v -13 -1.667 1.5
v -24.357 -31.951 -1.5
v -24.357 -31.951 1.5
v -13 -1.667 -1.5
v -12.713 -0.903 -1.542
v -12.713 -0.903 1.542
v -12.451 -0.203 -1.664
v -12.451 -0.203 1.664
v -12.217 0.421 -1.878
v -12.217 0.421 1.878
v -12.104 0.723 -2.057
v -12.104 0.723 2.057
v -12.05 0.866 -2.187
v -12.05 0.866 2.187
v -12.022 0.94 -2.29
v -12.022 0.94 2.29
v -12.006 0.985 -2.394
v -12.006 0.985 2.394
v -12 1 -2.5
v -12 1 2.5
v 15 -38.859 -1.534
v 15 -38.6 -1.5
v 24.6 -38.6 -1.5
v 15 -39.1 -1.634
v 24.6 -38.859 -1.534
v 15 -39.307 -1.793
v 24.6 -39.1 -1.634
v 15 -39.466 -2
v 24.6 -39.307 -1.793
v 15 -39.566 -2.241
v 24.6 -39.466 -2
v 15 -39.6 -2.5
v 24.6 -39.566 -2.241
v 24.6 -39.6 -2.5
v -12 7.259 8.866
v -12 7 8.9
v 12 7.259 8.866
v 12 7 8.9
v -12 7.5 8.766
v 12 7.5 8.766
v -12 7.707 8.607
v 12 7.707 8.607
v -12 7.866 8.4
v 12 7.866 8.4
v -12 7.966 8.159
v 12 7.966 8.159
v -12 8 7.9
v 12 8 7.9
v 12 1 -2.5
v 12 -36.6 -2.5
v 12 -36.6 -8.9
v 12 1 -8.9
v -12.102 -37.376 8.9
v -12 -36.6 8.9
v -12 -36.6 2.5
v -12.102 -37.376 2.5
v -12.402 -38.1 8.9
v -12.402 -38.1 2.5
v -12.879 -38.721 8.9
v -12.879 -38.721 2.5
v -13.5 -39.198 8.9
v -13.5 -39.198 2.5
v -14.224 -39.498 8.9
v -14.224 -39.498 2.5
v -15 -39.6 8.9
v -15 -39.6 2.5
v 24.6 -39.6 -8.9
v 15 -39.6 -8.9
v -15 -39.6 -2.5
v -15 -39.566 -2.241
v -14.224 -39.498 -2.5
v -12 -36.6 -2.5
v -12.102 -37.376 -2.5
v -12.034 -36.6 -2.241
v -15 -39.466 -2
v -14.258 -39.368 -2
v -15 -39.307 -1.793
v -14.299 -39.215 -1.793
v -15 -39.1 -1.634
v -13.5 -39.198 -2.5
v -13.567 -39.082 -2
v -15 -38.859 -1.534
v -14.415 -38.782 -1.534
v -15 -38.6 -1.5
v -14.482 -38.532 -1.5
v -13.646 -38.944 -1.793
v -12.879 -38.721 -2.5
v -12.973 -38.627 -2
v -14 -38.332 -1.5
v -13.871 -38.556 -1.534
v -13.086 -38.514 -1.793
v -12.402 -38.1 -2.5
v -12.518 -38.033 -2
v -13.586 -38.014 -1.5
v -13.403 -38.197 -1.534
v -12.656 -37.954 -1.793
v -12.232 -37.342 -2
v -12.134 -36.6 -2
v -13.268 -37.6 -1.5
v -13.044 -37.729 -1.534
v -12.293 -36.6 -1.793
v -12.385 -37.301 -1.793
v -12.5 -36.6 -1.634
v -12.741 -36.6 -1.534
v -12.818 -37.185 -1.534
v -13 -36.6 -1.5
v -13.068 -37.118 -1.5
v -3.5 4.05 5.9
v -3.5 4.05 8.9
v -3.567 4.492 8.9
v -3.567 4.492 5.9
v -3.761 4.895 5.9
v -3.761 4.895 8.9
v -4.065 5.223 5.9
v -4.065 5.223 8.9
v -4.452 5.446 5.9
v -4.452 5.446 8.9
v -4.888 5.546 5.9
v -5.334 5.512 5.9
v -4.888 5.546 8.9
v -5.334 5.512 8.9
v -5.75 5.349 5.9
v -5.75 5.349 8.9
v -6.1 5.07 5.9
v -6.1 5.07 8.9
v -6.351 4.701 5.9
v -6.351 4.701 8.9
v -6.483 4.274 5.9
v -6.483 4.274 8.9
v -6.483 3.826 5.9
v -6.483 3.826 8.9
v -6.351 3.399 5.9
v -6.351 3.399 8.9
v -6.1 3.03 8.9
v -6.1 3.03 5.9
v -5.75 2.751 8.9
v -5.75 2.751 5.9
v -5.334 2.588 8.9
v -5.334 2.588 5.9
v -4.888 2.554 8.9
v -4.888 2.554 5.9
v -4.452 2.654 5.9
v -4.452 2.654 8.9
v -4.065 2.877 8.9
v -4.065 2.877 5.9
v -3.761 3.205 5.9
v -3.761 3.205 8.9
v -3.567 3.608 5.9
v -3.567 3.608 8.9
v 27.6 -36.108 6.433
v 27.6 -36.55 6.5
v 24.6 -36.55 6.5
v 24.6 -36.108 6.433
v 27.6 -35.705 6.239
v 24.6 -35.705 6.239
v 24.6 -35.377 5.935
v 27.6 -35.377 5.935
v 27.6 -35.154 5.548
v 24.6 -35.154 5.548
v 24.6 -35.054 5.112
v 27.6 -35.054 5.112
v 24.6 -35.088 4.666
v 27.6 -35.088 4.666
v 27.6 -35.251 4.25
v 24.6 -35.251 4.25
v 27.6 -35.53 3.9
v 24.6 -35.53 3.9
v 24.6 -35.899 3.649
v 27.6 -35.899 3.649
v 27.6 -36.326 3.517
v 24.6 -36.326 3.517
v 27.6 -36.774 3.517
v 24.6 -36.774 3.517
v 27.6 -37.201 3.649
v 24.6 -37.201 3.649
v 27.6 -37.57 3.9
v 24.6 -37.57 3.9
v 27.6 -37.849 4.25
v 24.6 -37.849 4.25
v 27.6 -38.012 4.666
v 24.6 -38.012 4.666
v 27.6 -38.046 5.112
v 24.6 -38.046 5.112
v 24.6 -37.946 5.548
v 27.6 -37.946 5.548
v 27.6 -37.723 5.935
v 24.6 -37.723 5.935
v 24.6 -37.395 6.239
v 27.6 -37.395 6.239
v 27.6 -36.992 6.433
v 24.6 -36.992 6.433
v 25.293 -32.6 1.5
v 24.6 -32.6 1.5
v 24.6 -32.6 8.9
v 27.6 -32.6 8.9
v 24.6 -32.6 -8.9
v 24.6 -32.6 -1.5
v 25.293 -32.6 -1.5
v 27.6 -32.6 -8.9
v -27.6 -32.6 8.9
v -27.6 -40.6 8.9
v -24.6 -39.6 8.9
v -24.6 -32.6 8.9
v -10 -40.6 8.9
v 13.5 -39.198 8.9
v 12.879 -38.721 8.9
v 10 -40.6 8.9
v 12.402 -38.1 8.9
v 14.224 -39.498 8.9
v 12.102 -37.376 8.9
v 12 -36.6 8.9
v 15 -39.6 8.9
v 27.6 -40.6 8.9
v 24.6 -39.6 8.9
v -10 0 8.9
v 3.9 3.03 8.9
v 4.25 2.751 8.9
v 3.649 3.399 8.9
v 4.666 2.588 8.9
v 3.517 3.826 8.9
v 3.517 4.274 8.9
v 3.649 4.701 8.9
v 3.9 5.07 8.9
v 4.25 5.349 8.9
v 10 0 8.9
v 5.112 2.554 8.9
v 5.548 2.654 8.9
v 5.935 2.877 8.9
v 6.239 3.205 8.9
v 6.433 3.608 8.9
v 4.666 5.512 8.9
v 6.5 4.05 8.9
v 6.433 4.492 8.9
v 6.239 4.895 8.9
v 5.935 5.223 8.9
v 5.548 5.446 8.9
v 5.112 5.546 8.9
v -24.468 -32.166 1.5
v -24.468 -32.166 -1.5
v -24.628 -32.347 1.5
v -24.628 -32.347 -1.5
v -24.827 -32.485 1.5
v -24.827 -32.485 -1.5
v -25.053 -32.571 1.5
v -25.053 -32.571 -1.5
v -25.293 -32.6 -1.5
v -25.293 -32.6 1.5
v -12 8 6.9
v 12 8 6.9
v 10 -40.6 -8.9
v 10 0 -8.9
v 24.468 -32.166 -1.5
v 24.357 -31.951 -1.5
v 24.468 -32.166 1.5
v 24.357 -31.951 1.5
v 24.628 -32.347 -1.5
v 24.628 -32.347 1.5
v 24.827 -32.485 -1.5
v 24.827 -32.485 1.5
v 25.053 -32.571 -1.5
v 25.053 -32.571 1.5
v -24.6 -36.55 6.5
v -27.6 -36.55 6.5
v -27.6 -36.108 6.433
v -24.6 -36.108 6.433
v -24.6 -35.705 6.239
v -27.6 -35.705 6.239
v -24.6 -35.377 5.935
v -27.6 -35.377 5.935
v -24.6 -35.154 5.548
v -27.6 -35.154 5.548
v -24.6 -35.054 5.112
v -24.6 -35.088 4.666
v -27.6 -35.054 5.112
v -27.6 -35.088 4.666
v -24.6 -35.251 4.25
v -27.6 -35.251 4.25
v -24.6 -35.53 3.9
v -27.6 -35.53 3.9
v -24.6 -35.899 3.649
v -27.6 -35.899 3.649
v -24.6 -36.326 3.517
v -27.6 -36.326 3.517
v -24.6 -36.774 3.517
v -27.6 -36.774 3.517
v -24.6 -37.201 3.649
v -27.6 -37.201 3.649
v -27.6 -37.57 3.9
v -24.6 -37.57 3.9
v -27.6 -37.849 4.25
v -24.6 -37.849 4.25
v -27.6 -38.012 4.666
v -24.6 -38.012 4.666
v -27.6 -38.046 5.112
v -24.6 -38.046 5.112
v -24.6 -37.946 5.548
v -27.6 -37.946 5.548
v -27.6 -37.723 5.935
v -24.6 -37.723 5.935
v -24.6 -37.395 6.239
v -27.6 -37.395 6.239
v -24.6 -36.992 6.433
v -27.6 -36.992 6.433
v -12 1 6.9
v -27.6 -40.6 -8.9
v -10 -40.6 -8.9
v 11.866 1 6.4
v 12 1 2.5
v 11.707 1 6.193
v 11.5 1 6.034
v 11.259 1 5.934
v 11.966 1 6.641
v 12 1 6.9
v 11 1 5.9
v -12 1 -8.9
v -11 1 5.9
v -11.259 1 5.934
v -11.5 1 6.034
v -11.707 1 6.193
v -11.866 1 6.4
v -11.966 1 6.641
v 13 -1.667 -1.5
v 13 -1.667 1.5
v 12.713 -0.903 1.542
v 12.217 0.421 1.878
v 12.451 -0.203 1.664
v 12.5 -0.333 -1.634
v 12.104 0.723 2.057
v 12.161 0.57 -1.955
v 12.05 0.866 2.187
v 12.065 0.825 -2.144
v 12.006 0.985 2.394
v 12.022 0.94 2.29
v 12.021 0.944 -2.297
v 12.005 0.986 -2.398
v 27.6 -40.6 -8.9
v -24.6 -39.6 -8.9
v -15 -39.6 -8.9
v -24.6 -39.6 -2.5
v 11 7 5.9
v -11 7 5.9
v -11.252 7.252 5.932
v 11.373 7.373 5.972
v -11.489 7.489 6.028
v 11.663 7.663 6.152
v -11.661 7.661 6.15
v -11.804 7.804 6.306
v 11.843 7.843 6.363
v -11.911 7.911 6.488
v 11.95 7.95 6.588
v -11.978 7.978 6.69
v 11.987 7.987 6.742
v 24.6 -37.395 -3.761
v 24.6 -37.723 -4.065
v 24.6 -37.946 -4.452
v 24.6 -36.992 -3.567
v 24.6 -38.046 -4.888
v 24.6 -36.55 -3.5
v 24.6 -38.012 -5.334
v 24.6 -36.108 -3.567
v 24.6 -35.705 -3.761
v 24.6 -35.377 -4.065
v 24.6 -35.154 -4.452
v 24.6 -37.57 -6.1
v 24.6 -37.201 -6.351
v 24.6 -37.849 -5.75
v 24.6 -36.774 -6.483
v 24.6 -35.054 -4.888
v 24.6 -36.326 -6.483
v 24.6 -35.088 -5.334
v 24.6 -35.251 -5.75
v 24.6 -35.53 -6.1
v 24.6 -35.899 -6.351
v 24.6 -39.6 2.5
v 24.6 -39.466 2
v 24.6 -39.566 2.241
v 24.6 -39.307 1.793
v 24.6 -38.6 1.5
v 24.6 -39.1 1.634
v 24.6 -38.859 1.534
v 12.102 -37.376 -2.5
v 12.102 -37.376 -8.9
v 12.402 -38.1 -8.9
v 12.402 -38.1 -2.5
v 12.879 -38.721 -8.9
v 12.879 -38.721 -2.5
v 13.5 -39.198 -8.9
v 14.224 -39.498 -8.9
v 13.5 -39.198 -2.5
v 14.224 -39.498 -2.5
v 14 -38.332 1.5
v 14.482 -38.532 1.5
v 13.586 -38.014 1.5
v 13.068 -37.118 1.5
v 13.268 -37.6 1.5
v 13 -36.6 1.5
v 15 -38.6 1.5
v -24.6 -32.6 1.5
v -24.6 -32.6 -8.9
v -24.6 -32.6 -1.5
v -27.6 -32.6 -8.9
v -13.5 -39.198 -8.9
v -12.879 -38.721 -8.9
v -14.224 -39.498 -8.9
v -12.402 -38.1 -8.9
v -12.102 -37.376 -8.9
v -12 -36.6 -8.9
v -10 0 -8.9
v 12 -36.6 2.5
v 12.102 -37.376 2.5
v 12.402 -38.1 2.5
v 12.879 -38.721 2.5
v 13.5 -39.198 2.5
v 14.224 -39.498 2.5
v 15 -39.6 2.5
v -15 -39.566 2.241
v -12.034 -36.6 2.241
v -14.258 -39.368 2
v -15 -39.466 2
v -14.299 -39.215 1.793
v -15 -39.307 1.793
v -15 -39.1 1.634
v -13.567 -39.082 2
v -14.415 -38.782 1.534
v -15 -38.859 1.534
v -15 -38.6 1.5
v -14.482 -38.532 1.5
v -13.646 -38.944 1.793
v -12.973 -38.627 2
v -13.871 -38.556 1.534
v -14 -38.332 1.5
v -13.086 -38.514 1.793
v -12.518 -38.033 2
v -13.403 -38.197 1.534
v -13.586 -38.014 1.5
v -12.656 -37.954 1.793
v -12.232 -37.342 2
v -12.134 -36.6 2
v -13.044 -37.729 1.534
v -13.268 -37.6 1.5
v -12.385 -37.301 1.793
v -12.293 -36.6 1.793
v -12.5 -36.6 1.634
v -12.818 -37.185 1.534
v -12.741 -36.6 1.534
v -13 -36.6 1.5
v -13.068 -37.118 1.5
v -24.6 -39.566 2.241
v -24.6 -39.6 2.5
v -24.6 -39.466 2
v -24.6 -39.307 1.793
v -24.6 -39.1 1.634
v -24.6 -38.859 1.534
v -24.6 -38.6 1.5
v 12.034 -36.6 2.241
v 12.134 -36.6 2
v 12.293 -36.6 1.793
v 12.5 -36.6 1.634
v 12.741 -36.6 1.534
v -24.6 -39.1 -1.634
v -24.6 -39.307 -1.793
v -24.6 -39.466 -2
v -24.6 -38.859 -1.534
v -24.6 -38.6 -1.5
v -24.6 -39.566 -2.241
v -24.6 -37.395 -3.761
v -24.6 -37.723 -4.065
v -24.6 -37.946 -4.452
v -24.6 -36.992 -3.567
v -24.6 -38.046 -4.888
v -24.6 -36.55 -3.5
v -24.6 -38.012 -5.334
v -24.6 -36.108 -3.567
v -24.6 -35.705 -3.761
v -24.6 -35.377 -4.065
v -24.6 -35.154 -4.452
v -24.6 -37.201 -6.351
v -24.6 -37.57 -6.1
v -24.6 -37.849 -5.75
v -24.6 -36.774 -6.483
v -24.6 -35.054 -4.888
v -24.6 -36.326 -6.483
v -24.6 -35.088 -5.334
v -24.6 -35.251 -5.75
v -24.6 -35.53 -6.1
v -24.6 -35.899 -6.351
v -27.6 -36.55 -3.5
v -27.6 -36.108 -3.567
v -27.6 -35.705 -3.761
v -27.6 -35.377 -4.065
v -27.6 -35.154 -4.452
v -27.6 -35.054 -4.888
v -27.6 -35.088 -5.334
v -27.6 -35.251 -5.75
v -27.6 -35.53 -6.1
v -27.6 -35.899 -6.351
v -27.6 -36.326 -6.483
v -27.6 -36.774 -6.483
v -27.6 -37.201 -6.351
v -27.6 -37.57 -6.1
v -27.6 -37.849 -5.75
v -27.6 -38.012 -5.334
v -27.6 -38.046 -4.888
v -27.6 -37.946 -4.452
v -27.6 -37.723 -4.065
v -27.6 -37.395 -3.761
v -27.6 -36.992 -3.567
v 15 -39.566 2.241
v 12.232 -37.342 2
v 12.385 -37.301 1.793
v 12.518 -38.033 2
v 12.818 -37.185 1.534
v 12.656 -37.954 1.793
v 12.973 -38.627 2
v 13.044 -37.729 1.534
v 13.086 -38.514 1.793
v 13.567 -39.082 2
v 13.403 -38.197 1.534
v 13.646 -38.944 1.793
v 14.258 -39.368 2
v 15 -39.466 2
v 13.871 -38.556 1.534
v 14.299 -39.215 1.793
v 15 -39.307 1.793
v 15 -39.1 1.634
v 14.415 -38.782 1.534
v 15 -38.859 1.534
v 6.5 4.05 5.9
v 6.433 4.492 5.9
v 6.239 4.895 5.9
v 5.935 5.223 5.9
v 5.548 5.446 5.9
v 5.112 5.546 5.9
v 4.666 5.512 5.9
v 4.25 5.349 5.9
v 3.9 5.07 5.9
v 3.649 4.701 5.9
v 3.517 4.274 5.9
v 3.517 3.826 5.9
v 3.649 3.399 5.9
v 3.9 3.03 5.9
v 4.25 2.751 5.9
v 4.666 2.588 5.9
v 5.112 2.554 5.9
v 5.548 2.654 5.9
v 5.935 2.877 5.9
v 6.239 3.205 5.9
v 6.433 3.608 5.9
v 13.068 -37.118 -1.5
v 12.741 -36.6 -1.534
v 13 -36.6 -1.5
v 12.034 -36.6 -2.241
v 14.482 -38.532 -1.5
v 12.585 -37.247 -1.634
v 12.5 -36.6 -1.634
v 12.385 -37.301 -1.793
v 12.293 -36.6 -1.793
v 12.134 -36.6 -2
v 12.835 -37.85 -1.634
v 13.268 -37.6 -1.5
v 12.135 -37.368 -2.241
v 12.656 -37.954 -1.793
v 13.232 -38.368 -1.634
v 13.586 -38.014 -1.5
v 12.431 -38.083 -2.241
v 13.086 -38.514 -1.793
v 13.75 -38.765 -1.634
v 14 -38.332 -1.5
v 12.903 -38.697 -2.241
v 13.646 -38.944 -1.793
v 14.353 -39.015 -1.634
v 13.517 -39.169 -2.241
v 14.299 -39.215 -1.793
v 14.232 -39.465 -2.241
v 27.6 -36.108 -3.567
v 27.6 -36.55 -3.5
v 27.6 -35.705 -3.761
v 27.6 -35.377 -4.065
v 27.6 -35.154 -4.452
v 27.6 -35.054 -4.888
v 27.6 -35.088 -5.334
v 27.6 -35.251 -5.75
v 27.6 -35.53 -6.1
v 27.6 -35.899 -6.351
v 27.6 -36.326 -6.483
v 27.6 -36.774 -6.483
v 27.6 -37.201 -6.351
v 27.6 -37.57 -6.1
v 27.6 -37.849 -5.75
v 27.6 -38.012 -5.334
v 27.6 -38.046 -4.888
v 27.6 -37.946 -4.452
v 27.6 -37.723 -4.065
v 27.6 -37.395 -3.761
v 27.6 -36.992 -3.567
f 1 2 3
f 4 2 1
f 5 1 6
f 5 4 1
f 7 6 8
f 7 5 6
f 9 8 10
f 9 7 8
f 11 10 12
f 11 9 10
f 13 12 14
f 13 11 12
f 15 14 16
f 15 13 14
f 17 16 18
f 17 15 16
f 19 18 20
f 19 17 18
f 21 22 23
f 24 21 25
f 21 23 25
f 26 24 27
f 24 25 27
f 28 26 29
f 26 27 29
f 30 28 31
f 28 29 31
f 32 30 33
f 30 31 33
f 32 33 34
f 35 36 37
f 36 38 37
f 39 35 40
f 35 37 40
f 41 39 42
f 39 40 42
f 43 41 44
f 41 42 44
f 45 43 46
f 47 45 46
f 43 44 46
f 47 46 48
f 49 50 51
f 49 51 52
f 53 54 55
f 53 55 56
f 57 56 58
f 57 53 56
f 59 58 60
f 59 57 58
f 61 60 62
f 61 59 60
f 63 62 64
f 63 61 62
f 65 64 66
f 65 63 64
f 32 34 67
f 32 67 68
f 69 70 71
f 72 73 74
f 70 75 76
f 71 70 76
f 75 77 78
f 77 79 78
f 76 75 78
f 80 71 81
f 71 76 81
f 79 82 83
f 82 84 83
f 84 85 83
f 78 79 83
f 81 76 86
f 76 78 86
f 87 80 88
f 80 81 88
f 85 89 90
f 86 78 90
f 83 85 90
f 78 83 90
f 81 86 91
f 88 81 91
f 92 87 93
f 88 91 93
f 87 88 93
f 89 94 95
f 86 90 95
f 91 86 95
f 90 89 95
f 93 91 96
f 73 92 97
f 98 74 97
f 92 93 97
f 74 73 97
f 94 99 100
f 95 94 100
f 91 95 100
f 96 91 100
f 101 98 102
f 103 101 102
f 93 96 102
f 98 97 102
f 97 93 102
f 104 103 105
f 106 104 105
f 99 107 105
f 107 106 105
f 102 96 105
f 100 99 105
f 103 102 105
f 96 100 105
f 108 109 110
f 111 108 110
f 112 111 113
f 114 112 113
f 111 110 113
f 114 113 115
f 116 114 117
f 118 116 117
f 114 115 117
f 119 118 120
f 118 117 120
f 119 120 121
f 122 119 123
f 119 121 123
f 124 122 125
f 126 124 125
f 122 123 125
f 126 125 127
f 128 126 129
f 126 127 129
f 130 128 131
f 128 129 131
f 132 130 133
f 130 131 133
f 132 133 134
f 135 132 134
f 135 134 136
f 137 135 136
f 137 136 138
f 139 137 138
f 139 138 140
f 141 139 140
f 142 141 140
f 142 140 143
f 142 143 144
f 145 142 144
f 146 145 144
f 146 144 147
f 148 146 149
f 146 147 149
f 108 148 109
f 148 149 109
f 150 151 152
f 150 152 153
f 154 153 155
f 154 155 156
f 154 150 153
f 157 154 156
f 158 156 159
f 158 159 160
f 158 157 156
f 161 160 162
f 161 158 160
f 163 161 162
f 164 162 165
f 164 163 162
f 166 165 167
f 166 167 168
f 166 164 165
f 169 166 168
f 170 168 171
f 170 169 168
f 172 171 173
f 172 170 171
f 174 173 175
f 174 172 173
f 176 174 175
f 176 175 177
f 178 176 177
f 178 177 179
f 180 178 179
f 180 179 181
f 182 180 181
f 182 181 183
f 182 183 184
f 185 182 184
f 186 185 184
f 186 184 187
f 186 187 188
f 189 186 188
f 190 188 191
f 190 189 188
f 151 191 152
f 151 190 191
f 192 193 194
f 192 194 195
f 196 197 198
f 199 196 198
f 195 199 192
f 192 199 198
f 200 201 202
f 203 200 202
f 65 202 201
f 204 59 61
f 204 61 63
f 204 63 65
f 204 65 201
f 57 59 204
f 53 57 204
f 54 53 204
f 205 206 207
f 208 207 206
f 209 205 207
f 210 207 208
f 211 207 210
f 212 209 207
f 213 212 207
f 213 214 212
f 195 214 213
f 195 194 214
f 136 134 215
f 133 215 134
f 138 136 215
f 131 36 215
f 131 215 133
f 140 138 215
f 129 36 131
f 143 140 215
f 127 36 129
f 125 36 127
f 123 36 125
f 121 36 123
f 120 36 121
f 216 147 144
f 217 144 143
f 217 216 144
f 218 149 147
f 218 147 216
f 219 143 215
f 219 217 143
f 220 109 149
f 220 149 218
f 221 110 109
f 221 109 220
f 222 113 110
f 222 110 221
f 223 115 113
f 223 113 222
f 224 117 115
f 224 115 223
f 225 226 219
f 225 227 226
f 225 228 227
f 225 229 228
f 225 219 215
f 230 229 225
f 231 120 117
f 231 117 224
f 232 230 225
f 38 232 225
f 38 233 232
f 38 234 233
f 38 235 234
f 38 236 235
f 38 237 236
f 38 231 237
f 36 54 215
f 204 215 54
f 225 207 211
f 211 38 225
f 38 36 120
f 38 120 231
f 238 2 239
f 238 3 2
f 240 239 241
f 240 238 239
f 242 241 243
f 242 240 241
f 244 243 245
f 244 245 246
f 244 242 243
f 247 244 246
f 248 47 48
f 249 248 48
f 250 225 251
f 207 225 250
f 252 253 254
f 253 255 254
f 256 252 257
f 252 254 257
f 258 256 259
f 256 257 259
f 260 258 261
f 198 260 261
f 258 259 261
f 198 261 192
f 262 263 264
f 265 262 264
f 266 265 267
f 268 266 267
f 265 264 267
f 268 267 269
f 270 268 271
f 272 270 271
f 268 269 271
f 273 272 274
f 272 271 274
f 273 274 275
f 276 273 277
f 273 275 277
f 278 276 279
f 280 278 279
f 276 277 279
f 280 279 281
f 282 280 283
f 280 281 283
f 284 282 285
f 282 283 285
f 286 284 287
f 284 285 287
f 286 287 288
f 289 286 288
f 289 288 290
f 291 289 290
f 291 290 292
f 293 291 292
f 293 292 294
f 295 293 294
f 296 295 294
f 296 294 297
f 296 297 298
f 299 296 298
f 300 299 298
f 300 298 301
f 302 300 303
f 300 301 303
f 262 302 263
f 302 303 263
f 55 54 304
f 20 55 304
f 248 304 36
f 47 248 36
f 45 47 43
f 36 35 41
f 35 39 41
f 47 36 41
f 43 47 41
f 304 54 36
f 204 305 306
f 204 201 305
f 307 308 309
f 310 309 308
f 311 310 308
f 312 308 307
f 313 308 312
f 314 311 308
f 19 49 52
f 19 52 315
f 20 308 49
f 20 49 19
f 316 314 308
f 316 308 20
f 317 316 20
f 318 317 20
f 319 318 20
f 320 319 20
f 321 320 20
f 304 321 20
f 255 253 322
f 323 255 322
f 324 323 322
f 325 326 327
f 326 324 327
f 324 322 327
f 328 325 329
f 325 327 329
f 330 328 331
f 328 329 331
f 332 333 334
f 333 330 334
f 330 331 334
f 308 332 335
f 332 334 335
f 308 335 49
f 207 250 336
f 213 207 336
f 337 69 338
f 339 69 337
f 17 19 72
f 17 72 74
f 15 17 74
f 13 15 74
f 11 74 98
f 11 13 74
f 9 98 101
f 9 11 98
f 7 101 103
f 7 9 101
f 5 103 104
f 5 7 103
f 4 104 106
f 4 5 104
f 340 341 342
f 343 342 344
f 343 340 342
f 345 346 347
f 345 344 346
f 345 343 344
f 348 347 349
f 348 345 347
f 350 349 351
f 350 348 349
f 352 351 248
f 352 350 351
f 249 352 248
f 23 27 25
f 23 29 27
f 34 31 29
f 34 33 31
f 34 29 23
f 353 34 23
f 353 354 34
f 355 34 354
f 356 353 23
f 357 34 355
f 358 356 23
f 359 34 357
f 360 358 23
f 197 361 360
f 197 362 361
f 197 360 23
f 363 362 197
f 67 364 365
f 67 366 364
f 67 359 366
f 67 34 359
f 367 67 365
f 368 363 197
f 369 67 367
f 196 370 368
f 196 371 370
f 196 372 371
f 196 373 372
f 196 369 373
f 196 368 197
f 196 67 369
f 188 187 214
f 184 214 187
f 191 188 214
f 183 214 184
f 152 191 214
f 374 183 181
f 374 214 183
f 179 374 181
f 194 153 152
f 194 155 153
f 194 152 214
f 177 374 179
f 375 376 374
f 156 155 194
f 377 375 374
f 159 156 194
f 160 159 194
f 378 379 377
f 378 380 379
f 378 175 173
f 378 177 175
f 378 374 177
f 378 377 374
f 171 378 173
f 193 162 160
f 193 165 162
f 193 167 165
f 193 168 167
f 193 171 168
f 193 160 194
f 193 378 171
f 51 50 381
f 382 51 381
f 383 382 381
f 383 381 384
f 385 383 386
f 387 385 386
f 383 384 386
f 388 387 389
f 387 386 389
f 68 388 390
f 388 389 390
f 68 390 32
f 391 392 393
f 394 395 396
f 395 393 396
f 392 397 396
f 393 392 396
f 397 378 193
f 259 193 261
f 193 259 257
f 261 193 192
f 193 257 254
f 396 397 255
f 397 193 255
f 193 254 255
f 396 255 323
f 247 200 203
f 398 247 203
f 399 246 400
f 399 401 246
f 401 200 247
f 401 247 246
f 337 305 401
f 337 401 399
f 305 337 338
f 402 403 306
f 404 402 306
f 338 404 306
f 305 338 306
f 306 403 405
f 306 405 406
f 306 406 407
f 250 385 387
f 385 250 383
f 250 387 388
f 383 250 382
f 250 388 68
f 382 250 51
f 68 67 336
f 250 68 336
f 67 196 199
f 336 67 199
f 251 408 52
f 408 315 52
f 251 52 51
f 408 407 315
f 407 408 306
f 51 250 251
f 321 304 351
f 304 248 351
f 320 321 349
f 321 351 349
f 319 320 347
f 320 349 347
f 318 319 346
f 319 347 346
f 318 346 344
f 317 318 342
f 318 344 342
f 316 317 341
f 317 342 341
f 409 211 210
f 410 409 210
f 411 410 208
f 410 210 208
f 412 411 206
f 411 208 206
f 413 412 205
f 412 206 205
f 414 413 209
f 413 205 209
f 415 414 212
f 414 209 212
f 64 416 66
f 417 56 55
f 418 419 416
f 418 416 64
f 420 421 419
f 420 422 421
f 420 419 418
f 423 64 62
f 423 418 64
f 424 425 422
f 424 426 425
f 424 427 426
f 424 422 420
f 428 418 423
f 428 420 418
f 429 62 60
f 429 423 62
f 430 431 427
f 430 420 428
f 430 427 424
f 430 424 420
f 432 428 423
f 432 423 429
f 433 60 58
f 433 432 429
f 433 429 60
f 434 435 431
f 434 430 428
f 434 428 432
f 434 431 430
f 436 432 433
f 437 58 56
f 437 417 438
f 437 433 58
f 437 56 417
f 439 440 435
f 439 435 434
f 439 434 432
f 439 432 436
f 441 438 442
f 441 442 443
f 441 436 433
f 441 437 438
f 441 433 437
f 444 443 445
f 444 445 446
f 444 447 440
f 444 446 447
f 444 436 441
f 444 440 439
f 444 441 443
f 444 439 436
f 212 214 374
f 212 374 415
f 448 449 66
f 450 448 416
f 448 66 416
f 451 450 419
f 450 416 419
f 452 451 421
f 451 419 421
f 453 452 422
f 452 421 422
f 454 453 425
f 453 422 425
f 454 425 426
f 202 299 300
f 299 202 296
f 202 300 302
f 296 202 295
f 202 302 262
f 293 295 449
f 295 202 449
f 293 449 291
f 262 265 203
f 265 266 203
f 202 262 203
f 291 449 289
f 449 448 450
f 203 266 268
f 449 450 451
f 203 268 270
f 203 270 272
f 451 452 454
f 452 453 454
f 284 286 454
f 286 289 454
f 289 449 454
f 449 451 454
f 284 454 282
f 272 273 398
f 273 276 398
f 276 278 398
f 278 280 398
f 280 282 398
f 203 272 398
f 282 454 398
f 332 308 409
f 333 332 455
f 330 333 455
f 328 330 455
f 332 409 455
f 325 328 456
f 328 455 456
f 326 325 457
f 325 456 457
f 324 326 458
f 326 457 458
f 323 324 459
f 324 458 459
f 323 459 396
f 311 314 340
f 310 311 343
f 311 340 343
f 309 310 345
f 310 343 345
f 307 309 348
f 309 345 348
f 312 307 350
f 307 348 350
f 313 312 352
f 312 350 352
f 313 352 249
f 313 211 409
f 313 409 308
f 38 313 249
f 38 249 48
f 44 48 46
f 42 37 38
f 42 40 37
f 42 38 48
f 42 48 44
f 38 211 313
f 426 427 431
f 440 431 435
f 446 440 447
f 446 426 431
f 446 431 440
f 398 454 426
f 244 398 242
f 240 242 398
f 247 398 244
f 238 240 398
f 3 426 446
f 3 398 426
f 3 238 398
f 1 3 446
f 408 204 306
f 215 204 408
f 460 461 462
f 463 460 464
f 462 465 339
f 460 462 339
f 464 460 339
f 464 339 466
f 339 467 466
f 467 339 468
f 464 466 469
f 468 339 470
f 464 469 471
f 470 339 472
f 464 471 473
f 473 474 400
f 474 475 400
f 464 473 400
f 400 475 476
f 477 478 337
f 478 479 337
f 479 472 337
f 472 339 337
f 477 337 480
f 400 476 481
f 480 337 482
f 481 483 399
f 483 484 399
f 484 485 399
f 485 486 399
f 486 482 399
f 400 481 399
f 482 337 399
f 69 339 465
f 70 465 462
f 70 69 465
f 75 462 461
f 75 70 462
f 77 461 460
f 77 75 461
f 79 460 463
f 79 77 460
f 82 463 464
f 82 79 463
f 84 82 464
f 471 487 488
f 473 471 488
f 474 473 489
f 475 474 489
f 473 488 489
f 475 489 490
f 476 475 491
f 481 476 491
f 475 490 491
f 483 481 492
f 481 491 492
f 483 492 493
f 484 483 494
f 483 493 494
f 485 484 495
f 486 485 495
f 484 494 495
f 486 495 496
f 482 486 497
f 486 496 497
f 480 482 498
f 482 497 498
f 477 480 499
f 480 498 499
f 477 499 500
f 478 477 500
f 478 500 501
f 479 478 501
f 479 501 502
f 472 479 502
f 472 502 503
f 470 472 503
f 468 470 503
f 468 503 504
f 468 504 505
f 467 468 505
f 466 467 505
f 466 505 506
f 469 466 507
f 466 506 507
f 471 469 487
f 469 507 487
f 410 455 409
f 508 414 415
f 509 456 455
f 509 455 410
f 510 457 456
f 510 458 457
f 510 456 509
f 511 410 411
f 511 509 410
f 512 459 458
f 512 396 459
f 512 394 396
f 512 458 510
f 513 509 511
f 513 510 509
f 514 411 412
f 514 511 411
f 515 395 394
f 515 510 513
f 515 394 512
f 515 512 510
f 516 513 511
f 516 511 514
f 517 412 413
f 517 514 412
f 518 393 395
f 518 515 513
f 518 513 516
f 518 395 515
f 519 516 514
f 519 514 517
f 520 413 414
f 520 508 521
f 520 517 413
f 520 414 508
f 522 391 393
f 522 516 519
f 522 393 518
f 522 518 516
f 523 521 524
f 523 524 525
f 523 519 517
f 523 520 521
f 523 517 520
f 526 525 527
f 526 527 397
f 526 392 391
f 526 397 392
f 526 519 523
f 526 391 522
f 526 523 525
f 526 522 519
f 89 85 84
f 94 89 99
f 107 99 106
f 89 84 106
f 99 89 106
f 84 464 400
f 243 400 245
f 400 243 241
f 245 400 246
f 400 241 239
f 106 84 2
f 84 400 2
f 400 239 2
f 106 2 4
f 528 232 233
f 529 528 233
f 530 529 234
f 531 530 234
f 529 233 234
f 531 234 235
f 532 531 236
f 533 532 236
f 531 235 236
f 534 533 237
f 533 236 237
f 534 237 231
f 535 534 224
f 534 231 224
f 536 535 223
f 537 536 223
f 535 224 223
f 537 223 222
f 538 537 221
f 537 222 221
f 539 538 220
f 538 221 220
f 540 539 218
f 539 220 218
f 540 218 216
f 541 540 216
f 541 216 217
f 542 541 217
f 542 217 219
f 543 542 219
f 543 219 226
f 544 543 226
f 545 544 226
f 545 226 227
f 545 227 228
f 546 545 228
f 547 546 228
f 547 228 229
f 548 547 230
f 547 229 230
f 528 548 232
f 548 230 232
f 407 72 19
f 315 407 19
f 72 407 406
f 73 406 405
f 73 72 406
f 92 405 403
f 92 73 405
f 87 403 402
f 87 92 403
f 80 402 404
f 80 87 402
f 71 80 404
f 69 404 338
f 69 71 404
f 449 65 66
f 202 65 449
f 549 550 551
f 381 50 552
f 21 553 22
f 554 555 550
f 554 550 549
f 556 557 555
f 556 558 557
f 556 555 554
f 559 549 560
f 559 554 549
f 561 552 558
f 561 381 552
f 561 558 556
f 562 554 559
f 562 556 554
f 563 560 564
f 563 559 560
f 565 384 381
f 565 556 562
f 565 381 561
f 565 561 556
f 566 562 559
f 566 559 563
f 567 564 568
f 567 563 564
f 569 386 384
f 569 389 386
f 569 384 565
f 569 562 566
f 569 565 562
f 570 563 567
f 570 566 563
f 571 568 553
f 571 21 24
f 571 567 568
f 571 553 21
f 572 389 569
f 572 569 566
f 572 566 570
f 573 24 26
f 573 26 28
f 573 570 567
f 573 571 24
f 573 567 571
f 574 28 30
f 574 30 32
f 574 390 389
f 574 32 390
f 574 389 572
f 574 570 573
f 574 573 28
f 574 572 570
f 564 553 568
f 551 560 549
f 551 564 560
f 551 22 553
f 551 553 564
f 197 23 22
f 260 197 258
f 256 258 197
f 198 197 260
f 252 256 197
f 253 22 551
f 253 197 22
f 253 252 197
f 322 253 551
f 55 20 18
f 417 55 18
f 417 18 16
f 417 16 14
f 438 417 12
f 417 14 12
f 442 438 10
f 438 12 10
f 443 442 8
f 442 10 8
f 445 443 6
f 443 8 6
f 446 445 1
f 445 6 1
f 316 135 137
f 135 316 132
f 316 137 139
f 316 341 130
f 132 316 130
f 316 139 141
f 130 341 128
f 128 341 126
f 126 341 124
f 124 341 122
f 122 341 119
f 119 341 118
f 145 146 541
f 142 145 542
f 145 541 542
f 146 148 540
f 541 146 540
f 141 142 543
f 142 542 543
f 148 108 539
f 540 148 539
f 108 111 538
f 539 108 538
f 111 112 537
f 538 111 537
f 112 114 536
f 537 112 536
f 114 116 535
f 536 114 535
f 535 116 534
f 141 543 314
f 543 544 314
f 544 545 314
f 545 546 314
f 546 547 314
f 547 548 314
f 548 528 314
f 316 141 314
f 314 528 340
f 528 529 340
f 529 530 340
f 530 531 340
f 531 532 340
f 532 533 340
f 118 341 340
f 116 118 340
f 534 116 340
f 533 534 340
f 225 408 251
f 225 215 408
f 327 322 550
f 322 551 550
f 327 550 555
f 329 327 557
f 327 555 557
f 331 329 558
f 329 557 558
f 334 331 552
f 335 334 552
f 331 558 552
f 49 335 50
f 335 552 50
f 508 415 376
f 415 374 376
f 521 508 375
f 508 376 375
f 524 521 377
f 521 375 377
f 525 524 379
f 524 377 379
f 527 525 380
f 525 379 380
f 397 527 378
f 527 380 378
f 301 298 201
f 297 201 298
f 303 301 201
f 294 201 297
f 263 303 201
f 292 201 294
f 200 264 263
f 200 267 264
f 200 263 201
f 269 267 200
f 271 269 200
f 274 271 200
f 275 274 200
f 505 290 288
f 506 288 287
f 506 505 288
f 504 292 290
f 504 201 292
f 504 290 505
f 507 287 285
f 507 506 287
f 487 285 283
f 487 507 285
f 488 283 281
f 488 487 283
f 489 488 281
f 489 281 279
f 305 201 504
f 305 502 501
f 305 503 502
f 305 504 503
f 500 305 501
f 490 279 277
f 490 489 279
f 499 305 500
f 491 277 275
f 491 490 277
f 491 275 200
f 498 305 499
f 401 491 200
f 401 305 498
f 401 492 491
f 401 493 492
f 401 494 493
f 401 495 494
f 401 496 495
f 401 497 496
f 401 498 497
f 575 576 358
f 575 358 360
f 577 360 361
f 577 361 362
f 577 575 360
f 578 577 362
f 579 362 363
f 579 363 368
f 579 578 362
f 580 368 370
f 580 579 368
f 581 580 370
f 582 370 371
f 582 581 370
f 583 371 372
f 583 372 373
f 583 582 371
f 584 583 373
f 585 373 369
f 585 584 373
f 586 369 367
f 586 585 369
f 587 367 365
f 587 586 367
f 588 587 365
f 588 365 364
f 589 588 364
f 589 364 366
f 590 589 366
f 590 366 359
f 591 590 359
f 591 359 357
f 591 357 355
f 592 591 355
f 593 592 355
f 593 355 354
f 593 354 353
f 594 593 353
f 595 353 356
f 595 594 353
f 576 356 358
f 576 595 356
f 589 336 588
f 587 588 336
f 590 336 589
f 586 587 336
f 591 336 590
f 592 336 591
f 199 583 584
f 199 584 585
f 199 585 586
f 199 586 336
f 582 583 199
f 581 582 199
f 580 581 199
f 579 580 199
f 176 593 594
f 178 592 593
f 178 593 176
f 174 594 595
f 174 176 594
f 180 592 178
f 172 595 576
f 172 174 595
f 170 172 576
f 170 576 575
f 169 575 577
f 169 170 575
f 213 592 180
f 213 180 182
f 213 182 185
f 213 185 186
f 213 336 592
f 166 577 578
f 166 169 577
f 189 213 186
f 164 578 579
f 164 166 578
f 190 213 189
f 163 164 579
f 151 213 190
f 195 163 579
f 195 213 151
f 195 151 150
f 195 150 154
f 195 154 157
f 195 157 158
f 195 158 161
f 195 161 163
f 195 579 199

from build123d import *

# Parameters (mm, degrees)
BOSS_EXTRUDE1_DEPTH = 8.9
BOSS_EXTRUDE3_START = -8.9
SKETCH5_W           = 3
SKETCH5_H           = 7
BOSS_EXTRUDE3_DEPTH = 17.8
SKETCH9_W           = 24
SKETCH9_H           = 7
SKETCH9_R           = 1.5
BOSS_EXTRUDE4_DEPTH = 3
RIB2_REACH          = 51.893
SKETCH6_WALL_W      = 137.671187546
SKETCH6_WALL_H      = 3
SKETCH7_R           = 1.5
CUT_EXTRUDE2_DEPTH  = 3
FILLET1_R           = 3
FILLET2_R           = 1


with BuildPart() as part:
    # Sketch1 → Boss-Extrude1 (new, symmetric)
    with BuildSketch(Plane.XY):
        Polygon((-10, 0), (10, 0), (10, -40.6), (27.6, -40.6), (27.6, -39.6), (12, -39.6), (12, 1), (-12, 1), (-12, -39.6), (-27.6, -39.6), (-27.6, -40.6), (-10, -40.6), align=None)
    extrude(amount=BOSS_EXTRUDE1_DEPTH, both=True)

    # Sketch5 → Boss-Extrude3 (add)
    with BuildSketch(Plane.XY.offset(BOSS_EXTRUDE3_START)):
        with Locations((-26.1, -36.1)):
            Rectangle(SKETCH5_W, SKETCH5_H)
        with Locations((26.1, -36.1)):
            Rectangle(SKETCH5_W, SKETCH5_H)
    extrude(amount=BOSS_EXTRUDE3_DEPTH)

    # Sketch9 → Boss-Extrude4 (add)
    with BuildSketch(Plane.XY.offset(8.9)):
        with Locations((0, 4.5)):
            Rectangle(SKETCH9_W, SKETCH9_H)
        with Locations((-5, 4.05)):
            Circle(SKETCH9_R, mode=Mode.SUBTRACT)
        with Locations((5, 4.05)):
            Circle(SKETCH9_R, mode=Mode.SUBTRACT)
    extrude(amount=-BOSS_EXTRUDE4_DEPTH)

    # Sketch6 wall → Rib2 (add, up to next)
    with BuildSketch(Plane(origin=(-18.3, -15.8, 0), x_dir=(0.351123441588, 0.936329177569, 0), z_dir=(-0.936329177569, 0.351123441588, 0)), mode=Mode.PRIVATE) as rib2_sk1:
        Rectangle(SKETCH6_WALL_W, SKETCH6_WALL_H)
    rib2_tool1 = extrude(rib2_sk1.sketch, amount=-RIB2_REACH, mode=Mode.PRIVATE) - part.part
    rib2 = rib2_tool1.solids().sort_by_distance((-18.3, -15.8, 0))[0]
    add(rib2)

    # Mirror3: Rib2 across plane
    add(rib2.mirror(Plane(origin=(0, 0, 0), x_dir=(0, 0, 1), z_dir=(1, 0, 0))))

    # Sketch7 → Cut-Extrude2 (cut)
    with BuildSketch(Plane.ZY.offset(27.6)):
        with Locations((-5, -36.55)):
            Circle(SKETCH7_R)
        with Locations((5, -36.55)):
            Circle(SKETCH7_R)
    cut_extrude2 = extrude(amount=-CUT_EXTRUDE2_DEPTH, mode=Mode.SUBTRACT)

    # Mirror4: Cut-Extrude2 across plane
    add(cut_extrude2.mirror(Plane(origin=(0, 0, 0), x_dir=(0, 0, 1), z_dir=(1, 0, 0))), mode=Mode.SUBTRACT)

    # Fillet1
    fillet1_edges = [part.edges().sort_by_distance(p)[0] for p in [
        (12, -39.6, -5.2),
        (-12, -39.6, 5.2),
        (12, -39.6, 5.2),
        (-12, -39.6, -5.2),
    ]]
    fillet(fillet1_edges, radius=FILLET1_R)

    # Fillet2
    fillet2_edges = [part.edges().sort_by_distance(p)[0] for p in [
        (-12, -17.8, 1.5),
        (-12, -17.8, -1.5),
        (24.6, -32.6, 0),
        (19.8, -39.6, -1.5),
        (19.8, -39.6, 1.5),
        (-19.8, -39.6, -1.5),
        (-12.878679656, -38.721320344, -1.5),
        (-19.8, -39.6, 1.5),
        (-12.878679656, -38.721320344, 1.5),
        (12, -17.8, 1.5),
        (12.878679656, -38.721320344, 1.5),
        (12, -17.8, -1.5),
        (12.878679656, -38.721320344, -1.5),
        (12, 4.5, 5.9),
        (-12, 4.5, 5.9),
        (0, 8, 5.9),
        (0, 8, 8.9),
        (-24.6, -32.6, 0),
    ]]
    fillet(fillet2_edges, radius=FILLET2_R)


solid = part.part
